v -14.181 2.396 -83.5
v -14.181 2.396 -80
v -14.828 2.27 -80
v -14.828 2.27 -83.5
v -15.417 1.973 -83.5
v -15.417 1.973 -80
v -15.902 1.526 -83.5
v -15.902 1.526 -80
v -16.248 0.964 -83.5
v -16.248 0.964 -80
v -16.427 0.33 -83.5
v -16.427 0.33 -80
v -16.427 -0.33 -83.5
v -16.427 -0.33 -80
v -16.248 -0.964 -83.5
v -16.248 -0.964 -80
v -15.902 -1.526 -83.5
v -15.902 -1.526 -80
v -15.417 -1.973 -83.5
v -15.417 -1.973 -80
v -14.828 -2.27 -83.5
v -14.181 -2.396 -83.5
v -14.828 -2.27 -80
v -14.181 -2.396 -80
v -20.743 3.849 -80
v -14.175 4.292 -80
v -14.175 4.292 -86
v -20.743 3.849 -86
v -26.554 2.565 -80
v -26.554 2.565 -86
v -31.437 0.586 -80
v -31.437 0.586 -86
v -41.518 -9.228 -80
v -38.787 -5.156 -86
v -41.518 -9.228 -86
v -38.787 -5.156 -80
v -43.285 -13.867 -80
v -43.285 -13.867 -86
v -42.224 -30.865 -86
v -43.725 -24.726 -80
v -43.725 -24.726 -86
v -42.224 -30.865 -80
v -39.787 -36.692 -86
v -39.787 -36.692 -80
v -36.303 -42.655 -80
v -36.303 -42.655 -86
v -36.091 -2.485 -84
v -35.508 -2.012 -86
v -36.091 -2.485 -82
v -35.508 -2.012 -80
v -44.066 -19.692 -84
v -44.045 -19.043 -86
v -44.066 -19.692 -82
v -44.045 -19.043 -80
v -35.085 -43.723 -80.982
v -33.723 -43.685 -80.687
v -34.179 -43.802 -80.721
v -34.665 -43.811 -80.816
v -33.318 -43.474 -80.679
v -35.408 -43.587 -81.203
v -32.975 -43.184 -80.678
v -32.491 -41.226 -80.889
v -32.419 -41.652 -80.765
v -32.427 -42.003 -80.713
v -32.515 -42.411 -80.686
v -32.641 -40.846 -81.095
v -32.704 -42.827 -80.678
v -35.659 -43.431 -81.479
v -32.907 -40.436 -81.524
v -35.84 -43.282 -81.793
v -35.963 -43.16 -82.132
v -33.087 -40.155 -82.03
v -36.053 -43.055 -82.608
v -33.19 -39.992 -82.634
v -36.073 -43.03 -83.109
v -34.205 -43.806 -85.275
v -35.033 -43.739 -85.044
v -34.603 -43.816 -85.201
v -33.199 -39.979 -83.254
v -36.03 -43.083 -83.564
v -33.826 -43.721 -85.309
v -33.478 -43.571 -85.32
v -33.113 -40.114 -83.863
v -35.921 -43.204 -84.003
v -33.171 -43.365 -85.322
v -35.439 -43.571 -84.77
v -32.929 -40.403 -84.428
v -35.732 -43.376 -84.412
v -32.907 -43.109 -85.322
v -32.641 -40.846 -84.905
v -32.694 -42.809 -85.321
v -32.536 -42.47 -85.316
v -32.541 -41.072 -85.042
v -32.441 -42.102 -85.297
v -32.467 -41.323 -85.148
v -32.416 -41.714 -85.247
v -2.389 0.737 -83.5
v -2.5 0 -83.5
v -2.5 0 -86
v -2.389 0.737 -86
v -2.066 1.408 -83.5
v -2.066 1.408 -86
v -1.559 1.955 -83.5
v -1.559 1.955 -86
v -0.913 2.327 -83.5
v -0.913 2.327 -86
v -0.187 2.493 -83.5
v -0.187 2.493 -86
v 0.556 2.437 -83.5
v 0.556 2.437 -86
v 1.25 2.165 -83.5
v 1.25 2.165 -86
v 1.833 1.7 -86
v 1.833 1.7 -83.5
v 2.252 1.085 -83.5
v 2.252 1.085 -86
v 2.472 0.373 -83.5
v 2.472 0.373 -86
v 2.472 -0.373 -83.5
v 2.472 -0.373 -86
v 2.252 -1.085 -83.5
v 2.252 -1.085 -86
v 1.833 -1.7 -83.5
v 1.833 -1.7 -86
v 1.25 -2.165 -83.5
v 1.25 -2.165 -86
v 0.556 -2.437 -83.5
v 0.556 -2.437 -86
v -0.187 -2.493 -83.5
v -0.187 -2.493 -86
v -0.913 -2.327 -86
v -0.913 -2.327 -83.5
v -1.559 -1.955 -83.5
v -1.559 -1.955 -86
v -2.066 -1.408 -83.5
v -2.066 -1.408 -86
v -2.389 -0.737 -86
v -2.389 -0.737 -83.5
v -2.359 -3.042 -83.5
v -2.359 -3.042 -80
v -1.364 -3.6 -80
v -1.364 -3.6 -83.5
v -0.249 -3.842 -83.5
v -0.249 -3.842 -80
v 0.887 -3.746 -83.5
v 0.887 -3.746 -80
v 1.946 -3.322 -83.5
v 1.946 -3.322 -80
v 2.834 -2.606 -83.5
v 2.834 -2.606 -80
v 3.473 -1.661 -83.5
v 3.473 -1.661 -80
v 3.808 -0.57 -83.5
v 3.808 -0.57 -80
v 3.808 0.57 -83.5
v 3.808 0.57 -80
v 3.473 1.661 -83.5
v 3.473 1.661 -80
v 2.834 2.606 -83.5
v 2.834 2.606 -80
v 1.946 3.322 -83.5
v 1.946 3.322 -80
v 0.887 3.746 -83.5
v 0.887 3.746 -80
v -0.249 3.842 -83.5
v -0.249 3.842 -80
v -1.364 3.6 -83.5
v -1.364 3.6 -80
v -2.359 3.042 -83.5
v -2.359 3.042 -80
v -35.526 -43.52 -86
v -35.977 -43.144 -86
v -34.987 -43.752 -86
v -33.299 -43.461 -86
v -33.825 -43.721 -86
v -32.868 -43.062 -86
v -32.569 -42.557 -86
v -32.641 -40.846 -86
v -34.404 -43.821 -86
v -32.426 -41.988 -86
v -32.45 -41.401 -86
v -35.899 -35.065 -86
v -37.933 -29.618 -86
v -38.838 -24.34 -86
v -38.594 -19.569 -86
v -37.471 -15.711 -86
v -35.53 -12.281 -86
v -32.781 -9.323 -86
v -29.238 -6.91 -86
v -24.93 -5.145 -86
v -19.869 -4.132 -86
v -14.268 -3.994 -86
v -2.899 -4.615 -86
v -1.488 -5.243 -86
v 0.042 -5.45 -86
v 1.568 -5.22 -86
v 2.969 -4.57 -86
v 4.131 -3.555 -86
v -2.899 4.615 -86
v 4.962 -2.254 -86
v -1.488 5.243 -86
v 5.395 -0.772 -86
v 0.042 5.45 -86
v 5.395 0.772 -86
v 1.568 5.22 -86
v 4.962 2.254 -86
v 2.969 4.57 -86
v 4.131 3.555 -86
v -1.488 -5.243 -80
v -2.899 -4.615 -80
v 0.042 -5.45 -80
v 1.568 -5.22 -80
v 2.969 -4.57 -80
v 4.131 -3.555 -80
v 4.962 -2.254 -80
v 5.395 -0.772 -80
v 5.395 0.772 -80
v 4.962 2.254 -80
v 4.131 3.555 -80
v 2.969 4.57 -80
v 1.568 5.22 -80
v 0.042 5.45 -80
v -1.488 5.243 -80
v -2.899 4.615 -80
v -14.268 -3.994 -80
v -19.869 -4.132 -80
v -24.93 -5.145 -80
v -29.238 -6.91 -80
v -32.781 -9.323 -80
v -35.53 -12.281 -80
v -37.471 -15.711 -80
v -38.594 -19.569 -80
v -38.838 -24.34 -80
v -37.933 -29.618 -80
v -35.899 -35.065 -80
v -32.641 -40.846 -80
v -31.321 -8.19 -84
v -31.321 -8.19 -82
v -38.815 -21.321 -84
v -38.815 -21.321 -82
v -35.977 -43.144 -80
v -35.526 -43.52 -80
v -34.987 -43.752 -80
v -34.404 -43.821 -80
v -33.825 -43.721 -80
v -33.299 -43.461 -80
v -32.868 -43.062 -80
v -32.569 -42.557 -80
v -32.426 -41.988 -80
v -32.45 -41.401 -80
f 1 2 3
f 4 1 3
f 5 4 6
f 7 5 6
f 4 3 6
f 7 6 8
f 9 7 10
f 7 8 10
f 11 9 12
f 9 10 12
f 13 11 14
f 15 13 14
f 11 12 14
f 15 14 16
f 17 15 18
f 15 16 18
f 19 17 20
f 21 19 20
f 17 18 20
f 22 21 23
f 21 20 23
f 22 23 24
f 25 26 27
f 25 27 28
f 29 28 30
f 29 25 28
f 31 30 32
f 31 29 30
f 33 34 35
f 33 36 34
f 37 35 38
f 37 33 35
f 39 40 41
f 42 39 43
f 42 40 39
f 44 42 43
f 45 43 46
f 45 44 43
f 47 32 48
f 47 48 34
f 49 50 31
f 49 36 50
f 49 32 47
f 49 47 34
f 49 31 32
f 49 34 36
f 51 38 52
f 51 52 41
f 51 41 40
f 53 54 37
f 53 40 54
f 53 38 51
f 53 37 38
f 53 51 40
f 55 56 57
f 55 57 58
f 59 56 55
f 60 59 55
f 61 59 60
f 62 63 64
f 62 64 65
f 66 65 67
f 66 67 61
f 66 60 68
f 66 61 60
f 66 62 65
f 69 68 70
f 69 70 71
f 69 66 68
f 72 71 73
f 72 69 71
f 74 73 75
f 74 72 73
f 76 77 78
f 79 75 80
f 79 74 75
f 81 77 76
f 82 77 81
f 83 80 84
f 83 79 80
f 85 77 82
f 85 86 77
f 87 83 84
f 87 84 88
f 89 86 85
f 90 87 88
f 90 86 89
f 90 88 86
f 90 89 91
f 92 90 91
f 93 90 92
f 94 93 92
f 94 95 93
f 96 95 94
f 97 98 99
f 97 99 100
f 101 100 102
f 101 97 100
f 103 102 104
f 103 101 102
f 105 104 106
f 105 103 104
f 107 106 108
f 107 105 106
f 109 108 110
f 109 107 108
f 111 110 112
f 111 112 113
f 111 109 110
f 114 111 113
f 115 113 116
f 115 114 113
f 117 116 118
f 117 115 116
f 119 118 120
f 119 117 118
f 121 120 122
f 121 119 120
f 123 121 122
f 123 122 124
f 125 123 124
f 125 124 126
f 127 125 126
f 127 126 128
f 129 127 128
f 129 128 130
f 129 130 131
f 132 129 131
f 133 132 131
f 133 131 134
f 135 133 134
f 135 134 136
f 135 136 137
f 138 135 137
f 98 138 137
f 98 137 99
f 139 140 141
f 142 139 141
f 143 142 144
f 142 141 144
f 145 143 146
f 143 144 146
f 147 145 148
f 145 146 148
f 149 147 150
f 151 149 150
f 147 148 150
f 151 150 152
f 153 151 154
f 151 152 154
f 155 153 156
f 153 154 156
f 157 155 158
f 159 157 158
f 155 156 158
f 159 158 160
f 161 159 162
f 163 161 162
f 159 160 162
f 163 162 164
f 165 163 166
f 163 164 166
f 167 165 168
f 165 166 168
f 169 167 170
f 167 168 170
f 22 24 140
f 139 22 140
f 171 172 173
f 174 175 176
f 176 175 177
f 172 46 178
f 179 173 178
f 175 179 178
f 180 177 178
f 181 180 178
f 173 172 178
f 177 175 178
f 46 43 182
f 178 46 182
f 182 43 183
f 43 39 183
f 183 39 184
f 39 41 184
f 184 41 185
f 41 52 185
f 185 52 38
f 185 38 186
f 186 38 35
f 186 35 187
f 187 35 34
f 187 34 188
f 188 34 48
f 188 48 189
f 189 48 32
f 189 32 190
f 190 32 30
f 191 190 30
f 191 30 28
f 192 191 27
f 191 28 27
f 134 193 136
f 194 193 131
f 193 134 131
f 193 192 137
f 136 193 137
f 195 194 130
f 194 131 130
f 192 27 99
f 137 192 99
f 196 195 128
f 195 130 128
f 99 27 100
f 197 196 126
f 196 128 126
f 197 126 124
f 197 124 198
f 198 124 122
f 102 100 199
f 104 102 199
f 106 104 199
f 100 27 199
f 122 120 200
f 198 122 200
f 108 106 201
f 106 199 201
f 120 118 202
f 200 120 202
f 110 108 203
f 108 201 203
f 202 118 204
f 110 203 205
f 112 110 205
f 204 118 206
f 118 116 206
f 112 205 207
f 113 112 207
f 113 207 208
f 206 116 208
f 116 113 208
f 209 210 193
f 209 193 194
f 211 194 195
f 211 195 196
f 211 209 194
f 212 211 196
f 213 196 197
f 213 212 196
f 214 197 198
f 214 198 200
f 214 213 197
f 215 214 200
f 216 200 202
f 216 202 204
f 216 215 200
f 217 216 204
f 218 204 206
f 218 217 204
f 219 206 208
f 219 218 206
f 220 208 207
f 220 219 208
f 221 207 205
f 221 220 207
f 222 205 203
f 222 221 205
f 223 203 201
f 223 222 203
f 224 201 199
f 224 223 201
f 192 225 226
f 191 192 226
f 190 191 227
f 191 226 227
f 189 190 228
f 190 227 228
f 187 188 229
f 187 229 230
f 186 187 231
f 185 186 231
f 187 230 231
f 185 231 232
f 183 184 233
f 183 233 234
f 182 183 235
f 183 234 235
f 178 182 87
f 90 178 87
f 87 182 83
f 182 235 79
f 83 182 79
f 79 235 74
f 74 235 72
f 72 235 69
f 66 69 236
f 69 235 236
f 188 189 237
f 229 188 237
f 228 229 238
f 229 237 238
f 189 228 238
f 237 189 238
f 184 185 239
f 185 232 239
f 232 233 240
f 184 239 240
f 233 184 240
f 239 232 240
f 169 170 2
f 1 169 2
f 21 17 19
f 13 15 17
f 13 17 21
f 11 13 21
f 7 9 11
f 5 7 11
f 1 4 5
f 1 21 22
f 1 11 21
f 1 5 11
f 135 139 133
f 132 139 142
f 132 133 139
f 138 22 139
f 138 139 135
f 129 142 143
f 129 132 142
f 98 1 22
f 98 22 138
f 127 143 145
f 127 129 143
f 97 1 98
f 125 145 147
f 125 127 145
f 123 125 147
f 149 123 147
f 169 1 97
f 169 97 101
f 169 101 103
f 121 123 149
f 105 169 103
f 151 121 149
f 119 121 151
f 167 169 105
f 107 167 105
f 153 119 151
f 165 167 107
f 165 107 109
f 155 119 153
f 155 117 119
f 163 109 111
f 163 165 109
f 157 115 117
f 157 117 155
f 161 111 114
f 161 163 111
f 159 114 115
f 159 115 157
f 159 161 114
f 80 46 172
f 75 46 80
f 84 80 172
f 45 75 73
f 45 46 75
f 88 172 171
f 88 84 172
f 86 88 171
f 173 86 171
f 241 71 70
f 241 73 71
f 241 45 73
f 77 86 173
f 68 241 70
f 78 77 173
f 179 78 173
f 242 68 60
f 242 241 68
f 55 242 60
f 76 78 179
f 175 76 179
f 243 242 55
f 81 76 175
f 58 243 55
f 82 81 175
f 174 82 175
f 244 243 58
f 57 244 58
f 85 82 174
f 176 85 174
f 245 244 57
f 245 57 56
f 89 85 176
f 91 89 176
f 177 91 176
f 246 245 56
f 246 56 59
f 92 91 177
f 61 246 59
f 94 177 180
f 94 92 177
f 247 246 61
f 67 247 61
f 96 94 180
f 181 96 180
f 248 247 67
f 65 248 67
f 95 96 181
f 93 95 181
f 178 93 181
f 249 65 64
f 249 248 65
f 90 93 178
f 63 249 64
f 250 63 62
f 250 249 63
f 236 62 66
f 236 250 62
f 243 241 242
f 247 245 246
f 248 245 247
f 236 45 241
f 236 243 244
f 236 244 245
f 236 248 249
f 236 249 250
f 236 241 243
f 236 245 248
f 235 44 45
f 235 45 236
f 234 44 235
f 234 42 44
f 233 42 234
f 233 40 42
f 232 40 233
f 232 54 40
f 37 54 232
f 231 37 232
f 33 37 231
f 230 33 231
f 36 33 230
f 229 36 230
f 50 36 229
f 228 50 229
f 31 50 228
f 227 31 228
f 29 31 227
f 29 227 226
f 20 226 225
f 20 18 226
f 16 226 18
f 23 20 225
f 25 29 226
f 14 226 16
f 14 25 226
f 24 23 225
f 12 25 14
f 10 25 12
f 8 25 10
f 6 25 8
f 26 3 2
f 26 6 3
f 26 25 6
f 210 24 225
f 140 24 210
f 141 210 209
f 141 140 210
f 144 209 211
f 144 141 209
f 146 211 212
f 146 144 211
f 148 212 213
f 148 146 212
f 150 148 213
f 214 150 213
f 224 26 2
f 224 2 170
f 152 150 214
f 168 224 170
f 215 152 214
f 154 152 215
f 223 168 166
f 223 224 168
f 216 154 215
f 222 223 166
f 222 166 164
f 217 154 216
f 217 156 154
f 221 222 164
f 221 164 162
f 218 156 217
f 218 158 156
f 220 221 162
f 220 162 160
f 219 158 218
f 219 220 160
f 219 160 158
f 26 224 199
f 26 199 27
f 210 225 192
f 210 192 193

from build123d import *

# Parameters (mm, degrees)
BOSS_EXTRUDE1_DEPTH = 6
CUT_EXTRUDE1_DEPTH  = 3.5
SKETCH4_R           = 2.5
CUT_EXTRUDE2_DEPTH  = 3.5
SKETCH6_RX          = 2.368753343
SKETCH6_RY          = 2.322011883
CUT_EXTRUDE3_DEPTH  = 30


with BuildPart() as part:
    # Sketch1 → Boss-Extrude1 (new body)
    with BuildSketch(Plane.XY):
        with BuildLine():
            Line((-14.268243934, -3.994041761), (-2.898518265, -4.615310593))
            ThreePointArc((-2.898518265, -4.615310593), (5.45, 0), (-2.898518265, 4.615310593))
            Line((-2.898518265, 4.615310593), (-14.17529192, 4.292464798))
            add(Edge.make_bspline(
                [(-14.17529192, 4.292464798), (-42.462260129, 4.288818218), (-52.533757866, -18.372051692), (-36.302785322, -42.655354232)],
                knots=[0, 0, 0, 0, 1, 1, 1, 1], degree=3))
            ThreePointArc((-36.302785322, -42.655354232), (-33.552833422, -43.610103827), (-32.640753317, -40.845706583))
            add(Edge.make_bspline(
                [(-14.268243934, -3.994041761), (-34.73116579, -2.87481632), (-47.018413867, -18.971545605), (-32.640753317, -40.845706583)],
                knots=[0, 0, 0, 0, 1, 1, 1, 1], degree=3))
        make_face()
    extrude(amount=BOSS_EXTRUDE1_DEPTH)

    # Sketch3 → Cut-Extrude1 (cut)
    with BuildSketch(Plane.XY):
        with BuildLine():
            Line((-14.18094636, -2.396425056), (-2.359318085, -3.042386921))
            ThreePointArc((-2.359318085, -3.042386921), (3.85, 0), (-2.359318085, 3.042386921))
            Line((-2.359318085, 3.042386921), (-14.18094636, 2.396425056))
            ThreePointArc((-14.18094636, 2.396425056), (-16.45, 0), (-14.18094636, -2.396425056))
        make_face()
    extrude(amount=CUT_EXTRUDE1_DEPTH, mode=Mode.SUBTRACT)

    # Sketch4 → Cut-Extrude2 (cut)
    with BuildSketch(Plane(origin=(0, 0, 3.5), x_dir=(-1, 0, 0), z_dir=(0, 0, -1))):
        Circle(SKETCH4_R)
    extrude(amount=-CUT_EXTRUDE2_DEPTH, mode=Mode.SUBTRACT)

    # Sketch6 → Cut-Extrude3 (cut)
    with BuildSketch(Plane(origin=(-23.619287881, -25.215704234, 0), x_dir=(0, 0, -1), z_dir=(0.683626277, 0.72983225, 0))):
        with Locations(Location((-3, -5.45537074), (0, 0, -90))):
            Ellipse(SKETCH6_RX, SKETCH6_RY)
    extrude(amount=-CUT_EXTRUDE3_DEPTH, mode=Mode.SUBTRACT)


with BuildPart() as body_2:
    # Mirror3: mirrored copy
    add(part.part.mirror(Plane(origin=(0, 0, -40), x_dir=(1, 0, 0), z_dir=(0, 0, -1))))


solid = body_2.part
